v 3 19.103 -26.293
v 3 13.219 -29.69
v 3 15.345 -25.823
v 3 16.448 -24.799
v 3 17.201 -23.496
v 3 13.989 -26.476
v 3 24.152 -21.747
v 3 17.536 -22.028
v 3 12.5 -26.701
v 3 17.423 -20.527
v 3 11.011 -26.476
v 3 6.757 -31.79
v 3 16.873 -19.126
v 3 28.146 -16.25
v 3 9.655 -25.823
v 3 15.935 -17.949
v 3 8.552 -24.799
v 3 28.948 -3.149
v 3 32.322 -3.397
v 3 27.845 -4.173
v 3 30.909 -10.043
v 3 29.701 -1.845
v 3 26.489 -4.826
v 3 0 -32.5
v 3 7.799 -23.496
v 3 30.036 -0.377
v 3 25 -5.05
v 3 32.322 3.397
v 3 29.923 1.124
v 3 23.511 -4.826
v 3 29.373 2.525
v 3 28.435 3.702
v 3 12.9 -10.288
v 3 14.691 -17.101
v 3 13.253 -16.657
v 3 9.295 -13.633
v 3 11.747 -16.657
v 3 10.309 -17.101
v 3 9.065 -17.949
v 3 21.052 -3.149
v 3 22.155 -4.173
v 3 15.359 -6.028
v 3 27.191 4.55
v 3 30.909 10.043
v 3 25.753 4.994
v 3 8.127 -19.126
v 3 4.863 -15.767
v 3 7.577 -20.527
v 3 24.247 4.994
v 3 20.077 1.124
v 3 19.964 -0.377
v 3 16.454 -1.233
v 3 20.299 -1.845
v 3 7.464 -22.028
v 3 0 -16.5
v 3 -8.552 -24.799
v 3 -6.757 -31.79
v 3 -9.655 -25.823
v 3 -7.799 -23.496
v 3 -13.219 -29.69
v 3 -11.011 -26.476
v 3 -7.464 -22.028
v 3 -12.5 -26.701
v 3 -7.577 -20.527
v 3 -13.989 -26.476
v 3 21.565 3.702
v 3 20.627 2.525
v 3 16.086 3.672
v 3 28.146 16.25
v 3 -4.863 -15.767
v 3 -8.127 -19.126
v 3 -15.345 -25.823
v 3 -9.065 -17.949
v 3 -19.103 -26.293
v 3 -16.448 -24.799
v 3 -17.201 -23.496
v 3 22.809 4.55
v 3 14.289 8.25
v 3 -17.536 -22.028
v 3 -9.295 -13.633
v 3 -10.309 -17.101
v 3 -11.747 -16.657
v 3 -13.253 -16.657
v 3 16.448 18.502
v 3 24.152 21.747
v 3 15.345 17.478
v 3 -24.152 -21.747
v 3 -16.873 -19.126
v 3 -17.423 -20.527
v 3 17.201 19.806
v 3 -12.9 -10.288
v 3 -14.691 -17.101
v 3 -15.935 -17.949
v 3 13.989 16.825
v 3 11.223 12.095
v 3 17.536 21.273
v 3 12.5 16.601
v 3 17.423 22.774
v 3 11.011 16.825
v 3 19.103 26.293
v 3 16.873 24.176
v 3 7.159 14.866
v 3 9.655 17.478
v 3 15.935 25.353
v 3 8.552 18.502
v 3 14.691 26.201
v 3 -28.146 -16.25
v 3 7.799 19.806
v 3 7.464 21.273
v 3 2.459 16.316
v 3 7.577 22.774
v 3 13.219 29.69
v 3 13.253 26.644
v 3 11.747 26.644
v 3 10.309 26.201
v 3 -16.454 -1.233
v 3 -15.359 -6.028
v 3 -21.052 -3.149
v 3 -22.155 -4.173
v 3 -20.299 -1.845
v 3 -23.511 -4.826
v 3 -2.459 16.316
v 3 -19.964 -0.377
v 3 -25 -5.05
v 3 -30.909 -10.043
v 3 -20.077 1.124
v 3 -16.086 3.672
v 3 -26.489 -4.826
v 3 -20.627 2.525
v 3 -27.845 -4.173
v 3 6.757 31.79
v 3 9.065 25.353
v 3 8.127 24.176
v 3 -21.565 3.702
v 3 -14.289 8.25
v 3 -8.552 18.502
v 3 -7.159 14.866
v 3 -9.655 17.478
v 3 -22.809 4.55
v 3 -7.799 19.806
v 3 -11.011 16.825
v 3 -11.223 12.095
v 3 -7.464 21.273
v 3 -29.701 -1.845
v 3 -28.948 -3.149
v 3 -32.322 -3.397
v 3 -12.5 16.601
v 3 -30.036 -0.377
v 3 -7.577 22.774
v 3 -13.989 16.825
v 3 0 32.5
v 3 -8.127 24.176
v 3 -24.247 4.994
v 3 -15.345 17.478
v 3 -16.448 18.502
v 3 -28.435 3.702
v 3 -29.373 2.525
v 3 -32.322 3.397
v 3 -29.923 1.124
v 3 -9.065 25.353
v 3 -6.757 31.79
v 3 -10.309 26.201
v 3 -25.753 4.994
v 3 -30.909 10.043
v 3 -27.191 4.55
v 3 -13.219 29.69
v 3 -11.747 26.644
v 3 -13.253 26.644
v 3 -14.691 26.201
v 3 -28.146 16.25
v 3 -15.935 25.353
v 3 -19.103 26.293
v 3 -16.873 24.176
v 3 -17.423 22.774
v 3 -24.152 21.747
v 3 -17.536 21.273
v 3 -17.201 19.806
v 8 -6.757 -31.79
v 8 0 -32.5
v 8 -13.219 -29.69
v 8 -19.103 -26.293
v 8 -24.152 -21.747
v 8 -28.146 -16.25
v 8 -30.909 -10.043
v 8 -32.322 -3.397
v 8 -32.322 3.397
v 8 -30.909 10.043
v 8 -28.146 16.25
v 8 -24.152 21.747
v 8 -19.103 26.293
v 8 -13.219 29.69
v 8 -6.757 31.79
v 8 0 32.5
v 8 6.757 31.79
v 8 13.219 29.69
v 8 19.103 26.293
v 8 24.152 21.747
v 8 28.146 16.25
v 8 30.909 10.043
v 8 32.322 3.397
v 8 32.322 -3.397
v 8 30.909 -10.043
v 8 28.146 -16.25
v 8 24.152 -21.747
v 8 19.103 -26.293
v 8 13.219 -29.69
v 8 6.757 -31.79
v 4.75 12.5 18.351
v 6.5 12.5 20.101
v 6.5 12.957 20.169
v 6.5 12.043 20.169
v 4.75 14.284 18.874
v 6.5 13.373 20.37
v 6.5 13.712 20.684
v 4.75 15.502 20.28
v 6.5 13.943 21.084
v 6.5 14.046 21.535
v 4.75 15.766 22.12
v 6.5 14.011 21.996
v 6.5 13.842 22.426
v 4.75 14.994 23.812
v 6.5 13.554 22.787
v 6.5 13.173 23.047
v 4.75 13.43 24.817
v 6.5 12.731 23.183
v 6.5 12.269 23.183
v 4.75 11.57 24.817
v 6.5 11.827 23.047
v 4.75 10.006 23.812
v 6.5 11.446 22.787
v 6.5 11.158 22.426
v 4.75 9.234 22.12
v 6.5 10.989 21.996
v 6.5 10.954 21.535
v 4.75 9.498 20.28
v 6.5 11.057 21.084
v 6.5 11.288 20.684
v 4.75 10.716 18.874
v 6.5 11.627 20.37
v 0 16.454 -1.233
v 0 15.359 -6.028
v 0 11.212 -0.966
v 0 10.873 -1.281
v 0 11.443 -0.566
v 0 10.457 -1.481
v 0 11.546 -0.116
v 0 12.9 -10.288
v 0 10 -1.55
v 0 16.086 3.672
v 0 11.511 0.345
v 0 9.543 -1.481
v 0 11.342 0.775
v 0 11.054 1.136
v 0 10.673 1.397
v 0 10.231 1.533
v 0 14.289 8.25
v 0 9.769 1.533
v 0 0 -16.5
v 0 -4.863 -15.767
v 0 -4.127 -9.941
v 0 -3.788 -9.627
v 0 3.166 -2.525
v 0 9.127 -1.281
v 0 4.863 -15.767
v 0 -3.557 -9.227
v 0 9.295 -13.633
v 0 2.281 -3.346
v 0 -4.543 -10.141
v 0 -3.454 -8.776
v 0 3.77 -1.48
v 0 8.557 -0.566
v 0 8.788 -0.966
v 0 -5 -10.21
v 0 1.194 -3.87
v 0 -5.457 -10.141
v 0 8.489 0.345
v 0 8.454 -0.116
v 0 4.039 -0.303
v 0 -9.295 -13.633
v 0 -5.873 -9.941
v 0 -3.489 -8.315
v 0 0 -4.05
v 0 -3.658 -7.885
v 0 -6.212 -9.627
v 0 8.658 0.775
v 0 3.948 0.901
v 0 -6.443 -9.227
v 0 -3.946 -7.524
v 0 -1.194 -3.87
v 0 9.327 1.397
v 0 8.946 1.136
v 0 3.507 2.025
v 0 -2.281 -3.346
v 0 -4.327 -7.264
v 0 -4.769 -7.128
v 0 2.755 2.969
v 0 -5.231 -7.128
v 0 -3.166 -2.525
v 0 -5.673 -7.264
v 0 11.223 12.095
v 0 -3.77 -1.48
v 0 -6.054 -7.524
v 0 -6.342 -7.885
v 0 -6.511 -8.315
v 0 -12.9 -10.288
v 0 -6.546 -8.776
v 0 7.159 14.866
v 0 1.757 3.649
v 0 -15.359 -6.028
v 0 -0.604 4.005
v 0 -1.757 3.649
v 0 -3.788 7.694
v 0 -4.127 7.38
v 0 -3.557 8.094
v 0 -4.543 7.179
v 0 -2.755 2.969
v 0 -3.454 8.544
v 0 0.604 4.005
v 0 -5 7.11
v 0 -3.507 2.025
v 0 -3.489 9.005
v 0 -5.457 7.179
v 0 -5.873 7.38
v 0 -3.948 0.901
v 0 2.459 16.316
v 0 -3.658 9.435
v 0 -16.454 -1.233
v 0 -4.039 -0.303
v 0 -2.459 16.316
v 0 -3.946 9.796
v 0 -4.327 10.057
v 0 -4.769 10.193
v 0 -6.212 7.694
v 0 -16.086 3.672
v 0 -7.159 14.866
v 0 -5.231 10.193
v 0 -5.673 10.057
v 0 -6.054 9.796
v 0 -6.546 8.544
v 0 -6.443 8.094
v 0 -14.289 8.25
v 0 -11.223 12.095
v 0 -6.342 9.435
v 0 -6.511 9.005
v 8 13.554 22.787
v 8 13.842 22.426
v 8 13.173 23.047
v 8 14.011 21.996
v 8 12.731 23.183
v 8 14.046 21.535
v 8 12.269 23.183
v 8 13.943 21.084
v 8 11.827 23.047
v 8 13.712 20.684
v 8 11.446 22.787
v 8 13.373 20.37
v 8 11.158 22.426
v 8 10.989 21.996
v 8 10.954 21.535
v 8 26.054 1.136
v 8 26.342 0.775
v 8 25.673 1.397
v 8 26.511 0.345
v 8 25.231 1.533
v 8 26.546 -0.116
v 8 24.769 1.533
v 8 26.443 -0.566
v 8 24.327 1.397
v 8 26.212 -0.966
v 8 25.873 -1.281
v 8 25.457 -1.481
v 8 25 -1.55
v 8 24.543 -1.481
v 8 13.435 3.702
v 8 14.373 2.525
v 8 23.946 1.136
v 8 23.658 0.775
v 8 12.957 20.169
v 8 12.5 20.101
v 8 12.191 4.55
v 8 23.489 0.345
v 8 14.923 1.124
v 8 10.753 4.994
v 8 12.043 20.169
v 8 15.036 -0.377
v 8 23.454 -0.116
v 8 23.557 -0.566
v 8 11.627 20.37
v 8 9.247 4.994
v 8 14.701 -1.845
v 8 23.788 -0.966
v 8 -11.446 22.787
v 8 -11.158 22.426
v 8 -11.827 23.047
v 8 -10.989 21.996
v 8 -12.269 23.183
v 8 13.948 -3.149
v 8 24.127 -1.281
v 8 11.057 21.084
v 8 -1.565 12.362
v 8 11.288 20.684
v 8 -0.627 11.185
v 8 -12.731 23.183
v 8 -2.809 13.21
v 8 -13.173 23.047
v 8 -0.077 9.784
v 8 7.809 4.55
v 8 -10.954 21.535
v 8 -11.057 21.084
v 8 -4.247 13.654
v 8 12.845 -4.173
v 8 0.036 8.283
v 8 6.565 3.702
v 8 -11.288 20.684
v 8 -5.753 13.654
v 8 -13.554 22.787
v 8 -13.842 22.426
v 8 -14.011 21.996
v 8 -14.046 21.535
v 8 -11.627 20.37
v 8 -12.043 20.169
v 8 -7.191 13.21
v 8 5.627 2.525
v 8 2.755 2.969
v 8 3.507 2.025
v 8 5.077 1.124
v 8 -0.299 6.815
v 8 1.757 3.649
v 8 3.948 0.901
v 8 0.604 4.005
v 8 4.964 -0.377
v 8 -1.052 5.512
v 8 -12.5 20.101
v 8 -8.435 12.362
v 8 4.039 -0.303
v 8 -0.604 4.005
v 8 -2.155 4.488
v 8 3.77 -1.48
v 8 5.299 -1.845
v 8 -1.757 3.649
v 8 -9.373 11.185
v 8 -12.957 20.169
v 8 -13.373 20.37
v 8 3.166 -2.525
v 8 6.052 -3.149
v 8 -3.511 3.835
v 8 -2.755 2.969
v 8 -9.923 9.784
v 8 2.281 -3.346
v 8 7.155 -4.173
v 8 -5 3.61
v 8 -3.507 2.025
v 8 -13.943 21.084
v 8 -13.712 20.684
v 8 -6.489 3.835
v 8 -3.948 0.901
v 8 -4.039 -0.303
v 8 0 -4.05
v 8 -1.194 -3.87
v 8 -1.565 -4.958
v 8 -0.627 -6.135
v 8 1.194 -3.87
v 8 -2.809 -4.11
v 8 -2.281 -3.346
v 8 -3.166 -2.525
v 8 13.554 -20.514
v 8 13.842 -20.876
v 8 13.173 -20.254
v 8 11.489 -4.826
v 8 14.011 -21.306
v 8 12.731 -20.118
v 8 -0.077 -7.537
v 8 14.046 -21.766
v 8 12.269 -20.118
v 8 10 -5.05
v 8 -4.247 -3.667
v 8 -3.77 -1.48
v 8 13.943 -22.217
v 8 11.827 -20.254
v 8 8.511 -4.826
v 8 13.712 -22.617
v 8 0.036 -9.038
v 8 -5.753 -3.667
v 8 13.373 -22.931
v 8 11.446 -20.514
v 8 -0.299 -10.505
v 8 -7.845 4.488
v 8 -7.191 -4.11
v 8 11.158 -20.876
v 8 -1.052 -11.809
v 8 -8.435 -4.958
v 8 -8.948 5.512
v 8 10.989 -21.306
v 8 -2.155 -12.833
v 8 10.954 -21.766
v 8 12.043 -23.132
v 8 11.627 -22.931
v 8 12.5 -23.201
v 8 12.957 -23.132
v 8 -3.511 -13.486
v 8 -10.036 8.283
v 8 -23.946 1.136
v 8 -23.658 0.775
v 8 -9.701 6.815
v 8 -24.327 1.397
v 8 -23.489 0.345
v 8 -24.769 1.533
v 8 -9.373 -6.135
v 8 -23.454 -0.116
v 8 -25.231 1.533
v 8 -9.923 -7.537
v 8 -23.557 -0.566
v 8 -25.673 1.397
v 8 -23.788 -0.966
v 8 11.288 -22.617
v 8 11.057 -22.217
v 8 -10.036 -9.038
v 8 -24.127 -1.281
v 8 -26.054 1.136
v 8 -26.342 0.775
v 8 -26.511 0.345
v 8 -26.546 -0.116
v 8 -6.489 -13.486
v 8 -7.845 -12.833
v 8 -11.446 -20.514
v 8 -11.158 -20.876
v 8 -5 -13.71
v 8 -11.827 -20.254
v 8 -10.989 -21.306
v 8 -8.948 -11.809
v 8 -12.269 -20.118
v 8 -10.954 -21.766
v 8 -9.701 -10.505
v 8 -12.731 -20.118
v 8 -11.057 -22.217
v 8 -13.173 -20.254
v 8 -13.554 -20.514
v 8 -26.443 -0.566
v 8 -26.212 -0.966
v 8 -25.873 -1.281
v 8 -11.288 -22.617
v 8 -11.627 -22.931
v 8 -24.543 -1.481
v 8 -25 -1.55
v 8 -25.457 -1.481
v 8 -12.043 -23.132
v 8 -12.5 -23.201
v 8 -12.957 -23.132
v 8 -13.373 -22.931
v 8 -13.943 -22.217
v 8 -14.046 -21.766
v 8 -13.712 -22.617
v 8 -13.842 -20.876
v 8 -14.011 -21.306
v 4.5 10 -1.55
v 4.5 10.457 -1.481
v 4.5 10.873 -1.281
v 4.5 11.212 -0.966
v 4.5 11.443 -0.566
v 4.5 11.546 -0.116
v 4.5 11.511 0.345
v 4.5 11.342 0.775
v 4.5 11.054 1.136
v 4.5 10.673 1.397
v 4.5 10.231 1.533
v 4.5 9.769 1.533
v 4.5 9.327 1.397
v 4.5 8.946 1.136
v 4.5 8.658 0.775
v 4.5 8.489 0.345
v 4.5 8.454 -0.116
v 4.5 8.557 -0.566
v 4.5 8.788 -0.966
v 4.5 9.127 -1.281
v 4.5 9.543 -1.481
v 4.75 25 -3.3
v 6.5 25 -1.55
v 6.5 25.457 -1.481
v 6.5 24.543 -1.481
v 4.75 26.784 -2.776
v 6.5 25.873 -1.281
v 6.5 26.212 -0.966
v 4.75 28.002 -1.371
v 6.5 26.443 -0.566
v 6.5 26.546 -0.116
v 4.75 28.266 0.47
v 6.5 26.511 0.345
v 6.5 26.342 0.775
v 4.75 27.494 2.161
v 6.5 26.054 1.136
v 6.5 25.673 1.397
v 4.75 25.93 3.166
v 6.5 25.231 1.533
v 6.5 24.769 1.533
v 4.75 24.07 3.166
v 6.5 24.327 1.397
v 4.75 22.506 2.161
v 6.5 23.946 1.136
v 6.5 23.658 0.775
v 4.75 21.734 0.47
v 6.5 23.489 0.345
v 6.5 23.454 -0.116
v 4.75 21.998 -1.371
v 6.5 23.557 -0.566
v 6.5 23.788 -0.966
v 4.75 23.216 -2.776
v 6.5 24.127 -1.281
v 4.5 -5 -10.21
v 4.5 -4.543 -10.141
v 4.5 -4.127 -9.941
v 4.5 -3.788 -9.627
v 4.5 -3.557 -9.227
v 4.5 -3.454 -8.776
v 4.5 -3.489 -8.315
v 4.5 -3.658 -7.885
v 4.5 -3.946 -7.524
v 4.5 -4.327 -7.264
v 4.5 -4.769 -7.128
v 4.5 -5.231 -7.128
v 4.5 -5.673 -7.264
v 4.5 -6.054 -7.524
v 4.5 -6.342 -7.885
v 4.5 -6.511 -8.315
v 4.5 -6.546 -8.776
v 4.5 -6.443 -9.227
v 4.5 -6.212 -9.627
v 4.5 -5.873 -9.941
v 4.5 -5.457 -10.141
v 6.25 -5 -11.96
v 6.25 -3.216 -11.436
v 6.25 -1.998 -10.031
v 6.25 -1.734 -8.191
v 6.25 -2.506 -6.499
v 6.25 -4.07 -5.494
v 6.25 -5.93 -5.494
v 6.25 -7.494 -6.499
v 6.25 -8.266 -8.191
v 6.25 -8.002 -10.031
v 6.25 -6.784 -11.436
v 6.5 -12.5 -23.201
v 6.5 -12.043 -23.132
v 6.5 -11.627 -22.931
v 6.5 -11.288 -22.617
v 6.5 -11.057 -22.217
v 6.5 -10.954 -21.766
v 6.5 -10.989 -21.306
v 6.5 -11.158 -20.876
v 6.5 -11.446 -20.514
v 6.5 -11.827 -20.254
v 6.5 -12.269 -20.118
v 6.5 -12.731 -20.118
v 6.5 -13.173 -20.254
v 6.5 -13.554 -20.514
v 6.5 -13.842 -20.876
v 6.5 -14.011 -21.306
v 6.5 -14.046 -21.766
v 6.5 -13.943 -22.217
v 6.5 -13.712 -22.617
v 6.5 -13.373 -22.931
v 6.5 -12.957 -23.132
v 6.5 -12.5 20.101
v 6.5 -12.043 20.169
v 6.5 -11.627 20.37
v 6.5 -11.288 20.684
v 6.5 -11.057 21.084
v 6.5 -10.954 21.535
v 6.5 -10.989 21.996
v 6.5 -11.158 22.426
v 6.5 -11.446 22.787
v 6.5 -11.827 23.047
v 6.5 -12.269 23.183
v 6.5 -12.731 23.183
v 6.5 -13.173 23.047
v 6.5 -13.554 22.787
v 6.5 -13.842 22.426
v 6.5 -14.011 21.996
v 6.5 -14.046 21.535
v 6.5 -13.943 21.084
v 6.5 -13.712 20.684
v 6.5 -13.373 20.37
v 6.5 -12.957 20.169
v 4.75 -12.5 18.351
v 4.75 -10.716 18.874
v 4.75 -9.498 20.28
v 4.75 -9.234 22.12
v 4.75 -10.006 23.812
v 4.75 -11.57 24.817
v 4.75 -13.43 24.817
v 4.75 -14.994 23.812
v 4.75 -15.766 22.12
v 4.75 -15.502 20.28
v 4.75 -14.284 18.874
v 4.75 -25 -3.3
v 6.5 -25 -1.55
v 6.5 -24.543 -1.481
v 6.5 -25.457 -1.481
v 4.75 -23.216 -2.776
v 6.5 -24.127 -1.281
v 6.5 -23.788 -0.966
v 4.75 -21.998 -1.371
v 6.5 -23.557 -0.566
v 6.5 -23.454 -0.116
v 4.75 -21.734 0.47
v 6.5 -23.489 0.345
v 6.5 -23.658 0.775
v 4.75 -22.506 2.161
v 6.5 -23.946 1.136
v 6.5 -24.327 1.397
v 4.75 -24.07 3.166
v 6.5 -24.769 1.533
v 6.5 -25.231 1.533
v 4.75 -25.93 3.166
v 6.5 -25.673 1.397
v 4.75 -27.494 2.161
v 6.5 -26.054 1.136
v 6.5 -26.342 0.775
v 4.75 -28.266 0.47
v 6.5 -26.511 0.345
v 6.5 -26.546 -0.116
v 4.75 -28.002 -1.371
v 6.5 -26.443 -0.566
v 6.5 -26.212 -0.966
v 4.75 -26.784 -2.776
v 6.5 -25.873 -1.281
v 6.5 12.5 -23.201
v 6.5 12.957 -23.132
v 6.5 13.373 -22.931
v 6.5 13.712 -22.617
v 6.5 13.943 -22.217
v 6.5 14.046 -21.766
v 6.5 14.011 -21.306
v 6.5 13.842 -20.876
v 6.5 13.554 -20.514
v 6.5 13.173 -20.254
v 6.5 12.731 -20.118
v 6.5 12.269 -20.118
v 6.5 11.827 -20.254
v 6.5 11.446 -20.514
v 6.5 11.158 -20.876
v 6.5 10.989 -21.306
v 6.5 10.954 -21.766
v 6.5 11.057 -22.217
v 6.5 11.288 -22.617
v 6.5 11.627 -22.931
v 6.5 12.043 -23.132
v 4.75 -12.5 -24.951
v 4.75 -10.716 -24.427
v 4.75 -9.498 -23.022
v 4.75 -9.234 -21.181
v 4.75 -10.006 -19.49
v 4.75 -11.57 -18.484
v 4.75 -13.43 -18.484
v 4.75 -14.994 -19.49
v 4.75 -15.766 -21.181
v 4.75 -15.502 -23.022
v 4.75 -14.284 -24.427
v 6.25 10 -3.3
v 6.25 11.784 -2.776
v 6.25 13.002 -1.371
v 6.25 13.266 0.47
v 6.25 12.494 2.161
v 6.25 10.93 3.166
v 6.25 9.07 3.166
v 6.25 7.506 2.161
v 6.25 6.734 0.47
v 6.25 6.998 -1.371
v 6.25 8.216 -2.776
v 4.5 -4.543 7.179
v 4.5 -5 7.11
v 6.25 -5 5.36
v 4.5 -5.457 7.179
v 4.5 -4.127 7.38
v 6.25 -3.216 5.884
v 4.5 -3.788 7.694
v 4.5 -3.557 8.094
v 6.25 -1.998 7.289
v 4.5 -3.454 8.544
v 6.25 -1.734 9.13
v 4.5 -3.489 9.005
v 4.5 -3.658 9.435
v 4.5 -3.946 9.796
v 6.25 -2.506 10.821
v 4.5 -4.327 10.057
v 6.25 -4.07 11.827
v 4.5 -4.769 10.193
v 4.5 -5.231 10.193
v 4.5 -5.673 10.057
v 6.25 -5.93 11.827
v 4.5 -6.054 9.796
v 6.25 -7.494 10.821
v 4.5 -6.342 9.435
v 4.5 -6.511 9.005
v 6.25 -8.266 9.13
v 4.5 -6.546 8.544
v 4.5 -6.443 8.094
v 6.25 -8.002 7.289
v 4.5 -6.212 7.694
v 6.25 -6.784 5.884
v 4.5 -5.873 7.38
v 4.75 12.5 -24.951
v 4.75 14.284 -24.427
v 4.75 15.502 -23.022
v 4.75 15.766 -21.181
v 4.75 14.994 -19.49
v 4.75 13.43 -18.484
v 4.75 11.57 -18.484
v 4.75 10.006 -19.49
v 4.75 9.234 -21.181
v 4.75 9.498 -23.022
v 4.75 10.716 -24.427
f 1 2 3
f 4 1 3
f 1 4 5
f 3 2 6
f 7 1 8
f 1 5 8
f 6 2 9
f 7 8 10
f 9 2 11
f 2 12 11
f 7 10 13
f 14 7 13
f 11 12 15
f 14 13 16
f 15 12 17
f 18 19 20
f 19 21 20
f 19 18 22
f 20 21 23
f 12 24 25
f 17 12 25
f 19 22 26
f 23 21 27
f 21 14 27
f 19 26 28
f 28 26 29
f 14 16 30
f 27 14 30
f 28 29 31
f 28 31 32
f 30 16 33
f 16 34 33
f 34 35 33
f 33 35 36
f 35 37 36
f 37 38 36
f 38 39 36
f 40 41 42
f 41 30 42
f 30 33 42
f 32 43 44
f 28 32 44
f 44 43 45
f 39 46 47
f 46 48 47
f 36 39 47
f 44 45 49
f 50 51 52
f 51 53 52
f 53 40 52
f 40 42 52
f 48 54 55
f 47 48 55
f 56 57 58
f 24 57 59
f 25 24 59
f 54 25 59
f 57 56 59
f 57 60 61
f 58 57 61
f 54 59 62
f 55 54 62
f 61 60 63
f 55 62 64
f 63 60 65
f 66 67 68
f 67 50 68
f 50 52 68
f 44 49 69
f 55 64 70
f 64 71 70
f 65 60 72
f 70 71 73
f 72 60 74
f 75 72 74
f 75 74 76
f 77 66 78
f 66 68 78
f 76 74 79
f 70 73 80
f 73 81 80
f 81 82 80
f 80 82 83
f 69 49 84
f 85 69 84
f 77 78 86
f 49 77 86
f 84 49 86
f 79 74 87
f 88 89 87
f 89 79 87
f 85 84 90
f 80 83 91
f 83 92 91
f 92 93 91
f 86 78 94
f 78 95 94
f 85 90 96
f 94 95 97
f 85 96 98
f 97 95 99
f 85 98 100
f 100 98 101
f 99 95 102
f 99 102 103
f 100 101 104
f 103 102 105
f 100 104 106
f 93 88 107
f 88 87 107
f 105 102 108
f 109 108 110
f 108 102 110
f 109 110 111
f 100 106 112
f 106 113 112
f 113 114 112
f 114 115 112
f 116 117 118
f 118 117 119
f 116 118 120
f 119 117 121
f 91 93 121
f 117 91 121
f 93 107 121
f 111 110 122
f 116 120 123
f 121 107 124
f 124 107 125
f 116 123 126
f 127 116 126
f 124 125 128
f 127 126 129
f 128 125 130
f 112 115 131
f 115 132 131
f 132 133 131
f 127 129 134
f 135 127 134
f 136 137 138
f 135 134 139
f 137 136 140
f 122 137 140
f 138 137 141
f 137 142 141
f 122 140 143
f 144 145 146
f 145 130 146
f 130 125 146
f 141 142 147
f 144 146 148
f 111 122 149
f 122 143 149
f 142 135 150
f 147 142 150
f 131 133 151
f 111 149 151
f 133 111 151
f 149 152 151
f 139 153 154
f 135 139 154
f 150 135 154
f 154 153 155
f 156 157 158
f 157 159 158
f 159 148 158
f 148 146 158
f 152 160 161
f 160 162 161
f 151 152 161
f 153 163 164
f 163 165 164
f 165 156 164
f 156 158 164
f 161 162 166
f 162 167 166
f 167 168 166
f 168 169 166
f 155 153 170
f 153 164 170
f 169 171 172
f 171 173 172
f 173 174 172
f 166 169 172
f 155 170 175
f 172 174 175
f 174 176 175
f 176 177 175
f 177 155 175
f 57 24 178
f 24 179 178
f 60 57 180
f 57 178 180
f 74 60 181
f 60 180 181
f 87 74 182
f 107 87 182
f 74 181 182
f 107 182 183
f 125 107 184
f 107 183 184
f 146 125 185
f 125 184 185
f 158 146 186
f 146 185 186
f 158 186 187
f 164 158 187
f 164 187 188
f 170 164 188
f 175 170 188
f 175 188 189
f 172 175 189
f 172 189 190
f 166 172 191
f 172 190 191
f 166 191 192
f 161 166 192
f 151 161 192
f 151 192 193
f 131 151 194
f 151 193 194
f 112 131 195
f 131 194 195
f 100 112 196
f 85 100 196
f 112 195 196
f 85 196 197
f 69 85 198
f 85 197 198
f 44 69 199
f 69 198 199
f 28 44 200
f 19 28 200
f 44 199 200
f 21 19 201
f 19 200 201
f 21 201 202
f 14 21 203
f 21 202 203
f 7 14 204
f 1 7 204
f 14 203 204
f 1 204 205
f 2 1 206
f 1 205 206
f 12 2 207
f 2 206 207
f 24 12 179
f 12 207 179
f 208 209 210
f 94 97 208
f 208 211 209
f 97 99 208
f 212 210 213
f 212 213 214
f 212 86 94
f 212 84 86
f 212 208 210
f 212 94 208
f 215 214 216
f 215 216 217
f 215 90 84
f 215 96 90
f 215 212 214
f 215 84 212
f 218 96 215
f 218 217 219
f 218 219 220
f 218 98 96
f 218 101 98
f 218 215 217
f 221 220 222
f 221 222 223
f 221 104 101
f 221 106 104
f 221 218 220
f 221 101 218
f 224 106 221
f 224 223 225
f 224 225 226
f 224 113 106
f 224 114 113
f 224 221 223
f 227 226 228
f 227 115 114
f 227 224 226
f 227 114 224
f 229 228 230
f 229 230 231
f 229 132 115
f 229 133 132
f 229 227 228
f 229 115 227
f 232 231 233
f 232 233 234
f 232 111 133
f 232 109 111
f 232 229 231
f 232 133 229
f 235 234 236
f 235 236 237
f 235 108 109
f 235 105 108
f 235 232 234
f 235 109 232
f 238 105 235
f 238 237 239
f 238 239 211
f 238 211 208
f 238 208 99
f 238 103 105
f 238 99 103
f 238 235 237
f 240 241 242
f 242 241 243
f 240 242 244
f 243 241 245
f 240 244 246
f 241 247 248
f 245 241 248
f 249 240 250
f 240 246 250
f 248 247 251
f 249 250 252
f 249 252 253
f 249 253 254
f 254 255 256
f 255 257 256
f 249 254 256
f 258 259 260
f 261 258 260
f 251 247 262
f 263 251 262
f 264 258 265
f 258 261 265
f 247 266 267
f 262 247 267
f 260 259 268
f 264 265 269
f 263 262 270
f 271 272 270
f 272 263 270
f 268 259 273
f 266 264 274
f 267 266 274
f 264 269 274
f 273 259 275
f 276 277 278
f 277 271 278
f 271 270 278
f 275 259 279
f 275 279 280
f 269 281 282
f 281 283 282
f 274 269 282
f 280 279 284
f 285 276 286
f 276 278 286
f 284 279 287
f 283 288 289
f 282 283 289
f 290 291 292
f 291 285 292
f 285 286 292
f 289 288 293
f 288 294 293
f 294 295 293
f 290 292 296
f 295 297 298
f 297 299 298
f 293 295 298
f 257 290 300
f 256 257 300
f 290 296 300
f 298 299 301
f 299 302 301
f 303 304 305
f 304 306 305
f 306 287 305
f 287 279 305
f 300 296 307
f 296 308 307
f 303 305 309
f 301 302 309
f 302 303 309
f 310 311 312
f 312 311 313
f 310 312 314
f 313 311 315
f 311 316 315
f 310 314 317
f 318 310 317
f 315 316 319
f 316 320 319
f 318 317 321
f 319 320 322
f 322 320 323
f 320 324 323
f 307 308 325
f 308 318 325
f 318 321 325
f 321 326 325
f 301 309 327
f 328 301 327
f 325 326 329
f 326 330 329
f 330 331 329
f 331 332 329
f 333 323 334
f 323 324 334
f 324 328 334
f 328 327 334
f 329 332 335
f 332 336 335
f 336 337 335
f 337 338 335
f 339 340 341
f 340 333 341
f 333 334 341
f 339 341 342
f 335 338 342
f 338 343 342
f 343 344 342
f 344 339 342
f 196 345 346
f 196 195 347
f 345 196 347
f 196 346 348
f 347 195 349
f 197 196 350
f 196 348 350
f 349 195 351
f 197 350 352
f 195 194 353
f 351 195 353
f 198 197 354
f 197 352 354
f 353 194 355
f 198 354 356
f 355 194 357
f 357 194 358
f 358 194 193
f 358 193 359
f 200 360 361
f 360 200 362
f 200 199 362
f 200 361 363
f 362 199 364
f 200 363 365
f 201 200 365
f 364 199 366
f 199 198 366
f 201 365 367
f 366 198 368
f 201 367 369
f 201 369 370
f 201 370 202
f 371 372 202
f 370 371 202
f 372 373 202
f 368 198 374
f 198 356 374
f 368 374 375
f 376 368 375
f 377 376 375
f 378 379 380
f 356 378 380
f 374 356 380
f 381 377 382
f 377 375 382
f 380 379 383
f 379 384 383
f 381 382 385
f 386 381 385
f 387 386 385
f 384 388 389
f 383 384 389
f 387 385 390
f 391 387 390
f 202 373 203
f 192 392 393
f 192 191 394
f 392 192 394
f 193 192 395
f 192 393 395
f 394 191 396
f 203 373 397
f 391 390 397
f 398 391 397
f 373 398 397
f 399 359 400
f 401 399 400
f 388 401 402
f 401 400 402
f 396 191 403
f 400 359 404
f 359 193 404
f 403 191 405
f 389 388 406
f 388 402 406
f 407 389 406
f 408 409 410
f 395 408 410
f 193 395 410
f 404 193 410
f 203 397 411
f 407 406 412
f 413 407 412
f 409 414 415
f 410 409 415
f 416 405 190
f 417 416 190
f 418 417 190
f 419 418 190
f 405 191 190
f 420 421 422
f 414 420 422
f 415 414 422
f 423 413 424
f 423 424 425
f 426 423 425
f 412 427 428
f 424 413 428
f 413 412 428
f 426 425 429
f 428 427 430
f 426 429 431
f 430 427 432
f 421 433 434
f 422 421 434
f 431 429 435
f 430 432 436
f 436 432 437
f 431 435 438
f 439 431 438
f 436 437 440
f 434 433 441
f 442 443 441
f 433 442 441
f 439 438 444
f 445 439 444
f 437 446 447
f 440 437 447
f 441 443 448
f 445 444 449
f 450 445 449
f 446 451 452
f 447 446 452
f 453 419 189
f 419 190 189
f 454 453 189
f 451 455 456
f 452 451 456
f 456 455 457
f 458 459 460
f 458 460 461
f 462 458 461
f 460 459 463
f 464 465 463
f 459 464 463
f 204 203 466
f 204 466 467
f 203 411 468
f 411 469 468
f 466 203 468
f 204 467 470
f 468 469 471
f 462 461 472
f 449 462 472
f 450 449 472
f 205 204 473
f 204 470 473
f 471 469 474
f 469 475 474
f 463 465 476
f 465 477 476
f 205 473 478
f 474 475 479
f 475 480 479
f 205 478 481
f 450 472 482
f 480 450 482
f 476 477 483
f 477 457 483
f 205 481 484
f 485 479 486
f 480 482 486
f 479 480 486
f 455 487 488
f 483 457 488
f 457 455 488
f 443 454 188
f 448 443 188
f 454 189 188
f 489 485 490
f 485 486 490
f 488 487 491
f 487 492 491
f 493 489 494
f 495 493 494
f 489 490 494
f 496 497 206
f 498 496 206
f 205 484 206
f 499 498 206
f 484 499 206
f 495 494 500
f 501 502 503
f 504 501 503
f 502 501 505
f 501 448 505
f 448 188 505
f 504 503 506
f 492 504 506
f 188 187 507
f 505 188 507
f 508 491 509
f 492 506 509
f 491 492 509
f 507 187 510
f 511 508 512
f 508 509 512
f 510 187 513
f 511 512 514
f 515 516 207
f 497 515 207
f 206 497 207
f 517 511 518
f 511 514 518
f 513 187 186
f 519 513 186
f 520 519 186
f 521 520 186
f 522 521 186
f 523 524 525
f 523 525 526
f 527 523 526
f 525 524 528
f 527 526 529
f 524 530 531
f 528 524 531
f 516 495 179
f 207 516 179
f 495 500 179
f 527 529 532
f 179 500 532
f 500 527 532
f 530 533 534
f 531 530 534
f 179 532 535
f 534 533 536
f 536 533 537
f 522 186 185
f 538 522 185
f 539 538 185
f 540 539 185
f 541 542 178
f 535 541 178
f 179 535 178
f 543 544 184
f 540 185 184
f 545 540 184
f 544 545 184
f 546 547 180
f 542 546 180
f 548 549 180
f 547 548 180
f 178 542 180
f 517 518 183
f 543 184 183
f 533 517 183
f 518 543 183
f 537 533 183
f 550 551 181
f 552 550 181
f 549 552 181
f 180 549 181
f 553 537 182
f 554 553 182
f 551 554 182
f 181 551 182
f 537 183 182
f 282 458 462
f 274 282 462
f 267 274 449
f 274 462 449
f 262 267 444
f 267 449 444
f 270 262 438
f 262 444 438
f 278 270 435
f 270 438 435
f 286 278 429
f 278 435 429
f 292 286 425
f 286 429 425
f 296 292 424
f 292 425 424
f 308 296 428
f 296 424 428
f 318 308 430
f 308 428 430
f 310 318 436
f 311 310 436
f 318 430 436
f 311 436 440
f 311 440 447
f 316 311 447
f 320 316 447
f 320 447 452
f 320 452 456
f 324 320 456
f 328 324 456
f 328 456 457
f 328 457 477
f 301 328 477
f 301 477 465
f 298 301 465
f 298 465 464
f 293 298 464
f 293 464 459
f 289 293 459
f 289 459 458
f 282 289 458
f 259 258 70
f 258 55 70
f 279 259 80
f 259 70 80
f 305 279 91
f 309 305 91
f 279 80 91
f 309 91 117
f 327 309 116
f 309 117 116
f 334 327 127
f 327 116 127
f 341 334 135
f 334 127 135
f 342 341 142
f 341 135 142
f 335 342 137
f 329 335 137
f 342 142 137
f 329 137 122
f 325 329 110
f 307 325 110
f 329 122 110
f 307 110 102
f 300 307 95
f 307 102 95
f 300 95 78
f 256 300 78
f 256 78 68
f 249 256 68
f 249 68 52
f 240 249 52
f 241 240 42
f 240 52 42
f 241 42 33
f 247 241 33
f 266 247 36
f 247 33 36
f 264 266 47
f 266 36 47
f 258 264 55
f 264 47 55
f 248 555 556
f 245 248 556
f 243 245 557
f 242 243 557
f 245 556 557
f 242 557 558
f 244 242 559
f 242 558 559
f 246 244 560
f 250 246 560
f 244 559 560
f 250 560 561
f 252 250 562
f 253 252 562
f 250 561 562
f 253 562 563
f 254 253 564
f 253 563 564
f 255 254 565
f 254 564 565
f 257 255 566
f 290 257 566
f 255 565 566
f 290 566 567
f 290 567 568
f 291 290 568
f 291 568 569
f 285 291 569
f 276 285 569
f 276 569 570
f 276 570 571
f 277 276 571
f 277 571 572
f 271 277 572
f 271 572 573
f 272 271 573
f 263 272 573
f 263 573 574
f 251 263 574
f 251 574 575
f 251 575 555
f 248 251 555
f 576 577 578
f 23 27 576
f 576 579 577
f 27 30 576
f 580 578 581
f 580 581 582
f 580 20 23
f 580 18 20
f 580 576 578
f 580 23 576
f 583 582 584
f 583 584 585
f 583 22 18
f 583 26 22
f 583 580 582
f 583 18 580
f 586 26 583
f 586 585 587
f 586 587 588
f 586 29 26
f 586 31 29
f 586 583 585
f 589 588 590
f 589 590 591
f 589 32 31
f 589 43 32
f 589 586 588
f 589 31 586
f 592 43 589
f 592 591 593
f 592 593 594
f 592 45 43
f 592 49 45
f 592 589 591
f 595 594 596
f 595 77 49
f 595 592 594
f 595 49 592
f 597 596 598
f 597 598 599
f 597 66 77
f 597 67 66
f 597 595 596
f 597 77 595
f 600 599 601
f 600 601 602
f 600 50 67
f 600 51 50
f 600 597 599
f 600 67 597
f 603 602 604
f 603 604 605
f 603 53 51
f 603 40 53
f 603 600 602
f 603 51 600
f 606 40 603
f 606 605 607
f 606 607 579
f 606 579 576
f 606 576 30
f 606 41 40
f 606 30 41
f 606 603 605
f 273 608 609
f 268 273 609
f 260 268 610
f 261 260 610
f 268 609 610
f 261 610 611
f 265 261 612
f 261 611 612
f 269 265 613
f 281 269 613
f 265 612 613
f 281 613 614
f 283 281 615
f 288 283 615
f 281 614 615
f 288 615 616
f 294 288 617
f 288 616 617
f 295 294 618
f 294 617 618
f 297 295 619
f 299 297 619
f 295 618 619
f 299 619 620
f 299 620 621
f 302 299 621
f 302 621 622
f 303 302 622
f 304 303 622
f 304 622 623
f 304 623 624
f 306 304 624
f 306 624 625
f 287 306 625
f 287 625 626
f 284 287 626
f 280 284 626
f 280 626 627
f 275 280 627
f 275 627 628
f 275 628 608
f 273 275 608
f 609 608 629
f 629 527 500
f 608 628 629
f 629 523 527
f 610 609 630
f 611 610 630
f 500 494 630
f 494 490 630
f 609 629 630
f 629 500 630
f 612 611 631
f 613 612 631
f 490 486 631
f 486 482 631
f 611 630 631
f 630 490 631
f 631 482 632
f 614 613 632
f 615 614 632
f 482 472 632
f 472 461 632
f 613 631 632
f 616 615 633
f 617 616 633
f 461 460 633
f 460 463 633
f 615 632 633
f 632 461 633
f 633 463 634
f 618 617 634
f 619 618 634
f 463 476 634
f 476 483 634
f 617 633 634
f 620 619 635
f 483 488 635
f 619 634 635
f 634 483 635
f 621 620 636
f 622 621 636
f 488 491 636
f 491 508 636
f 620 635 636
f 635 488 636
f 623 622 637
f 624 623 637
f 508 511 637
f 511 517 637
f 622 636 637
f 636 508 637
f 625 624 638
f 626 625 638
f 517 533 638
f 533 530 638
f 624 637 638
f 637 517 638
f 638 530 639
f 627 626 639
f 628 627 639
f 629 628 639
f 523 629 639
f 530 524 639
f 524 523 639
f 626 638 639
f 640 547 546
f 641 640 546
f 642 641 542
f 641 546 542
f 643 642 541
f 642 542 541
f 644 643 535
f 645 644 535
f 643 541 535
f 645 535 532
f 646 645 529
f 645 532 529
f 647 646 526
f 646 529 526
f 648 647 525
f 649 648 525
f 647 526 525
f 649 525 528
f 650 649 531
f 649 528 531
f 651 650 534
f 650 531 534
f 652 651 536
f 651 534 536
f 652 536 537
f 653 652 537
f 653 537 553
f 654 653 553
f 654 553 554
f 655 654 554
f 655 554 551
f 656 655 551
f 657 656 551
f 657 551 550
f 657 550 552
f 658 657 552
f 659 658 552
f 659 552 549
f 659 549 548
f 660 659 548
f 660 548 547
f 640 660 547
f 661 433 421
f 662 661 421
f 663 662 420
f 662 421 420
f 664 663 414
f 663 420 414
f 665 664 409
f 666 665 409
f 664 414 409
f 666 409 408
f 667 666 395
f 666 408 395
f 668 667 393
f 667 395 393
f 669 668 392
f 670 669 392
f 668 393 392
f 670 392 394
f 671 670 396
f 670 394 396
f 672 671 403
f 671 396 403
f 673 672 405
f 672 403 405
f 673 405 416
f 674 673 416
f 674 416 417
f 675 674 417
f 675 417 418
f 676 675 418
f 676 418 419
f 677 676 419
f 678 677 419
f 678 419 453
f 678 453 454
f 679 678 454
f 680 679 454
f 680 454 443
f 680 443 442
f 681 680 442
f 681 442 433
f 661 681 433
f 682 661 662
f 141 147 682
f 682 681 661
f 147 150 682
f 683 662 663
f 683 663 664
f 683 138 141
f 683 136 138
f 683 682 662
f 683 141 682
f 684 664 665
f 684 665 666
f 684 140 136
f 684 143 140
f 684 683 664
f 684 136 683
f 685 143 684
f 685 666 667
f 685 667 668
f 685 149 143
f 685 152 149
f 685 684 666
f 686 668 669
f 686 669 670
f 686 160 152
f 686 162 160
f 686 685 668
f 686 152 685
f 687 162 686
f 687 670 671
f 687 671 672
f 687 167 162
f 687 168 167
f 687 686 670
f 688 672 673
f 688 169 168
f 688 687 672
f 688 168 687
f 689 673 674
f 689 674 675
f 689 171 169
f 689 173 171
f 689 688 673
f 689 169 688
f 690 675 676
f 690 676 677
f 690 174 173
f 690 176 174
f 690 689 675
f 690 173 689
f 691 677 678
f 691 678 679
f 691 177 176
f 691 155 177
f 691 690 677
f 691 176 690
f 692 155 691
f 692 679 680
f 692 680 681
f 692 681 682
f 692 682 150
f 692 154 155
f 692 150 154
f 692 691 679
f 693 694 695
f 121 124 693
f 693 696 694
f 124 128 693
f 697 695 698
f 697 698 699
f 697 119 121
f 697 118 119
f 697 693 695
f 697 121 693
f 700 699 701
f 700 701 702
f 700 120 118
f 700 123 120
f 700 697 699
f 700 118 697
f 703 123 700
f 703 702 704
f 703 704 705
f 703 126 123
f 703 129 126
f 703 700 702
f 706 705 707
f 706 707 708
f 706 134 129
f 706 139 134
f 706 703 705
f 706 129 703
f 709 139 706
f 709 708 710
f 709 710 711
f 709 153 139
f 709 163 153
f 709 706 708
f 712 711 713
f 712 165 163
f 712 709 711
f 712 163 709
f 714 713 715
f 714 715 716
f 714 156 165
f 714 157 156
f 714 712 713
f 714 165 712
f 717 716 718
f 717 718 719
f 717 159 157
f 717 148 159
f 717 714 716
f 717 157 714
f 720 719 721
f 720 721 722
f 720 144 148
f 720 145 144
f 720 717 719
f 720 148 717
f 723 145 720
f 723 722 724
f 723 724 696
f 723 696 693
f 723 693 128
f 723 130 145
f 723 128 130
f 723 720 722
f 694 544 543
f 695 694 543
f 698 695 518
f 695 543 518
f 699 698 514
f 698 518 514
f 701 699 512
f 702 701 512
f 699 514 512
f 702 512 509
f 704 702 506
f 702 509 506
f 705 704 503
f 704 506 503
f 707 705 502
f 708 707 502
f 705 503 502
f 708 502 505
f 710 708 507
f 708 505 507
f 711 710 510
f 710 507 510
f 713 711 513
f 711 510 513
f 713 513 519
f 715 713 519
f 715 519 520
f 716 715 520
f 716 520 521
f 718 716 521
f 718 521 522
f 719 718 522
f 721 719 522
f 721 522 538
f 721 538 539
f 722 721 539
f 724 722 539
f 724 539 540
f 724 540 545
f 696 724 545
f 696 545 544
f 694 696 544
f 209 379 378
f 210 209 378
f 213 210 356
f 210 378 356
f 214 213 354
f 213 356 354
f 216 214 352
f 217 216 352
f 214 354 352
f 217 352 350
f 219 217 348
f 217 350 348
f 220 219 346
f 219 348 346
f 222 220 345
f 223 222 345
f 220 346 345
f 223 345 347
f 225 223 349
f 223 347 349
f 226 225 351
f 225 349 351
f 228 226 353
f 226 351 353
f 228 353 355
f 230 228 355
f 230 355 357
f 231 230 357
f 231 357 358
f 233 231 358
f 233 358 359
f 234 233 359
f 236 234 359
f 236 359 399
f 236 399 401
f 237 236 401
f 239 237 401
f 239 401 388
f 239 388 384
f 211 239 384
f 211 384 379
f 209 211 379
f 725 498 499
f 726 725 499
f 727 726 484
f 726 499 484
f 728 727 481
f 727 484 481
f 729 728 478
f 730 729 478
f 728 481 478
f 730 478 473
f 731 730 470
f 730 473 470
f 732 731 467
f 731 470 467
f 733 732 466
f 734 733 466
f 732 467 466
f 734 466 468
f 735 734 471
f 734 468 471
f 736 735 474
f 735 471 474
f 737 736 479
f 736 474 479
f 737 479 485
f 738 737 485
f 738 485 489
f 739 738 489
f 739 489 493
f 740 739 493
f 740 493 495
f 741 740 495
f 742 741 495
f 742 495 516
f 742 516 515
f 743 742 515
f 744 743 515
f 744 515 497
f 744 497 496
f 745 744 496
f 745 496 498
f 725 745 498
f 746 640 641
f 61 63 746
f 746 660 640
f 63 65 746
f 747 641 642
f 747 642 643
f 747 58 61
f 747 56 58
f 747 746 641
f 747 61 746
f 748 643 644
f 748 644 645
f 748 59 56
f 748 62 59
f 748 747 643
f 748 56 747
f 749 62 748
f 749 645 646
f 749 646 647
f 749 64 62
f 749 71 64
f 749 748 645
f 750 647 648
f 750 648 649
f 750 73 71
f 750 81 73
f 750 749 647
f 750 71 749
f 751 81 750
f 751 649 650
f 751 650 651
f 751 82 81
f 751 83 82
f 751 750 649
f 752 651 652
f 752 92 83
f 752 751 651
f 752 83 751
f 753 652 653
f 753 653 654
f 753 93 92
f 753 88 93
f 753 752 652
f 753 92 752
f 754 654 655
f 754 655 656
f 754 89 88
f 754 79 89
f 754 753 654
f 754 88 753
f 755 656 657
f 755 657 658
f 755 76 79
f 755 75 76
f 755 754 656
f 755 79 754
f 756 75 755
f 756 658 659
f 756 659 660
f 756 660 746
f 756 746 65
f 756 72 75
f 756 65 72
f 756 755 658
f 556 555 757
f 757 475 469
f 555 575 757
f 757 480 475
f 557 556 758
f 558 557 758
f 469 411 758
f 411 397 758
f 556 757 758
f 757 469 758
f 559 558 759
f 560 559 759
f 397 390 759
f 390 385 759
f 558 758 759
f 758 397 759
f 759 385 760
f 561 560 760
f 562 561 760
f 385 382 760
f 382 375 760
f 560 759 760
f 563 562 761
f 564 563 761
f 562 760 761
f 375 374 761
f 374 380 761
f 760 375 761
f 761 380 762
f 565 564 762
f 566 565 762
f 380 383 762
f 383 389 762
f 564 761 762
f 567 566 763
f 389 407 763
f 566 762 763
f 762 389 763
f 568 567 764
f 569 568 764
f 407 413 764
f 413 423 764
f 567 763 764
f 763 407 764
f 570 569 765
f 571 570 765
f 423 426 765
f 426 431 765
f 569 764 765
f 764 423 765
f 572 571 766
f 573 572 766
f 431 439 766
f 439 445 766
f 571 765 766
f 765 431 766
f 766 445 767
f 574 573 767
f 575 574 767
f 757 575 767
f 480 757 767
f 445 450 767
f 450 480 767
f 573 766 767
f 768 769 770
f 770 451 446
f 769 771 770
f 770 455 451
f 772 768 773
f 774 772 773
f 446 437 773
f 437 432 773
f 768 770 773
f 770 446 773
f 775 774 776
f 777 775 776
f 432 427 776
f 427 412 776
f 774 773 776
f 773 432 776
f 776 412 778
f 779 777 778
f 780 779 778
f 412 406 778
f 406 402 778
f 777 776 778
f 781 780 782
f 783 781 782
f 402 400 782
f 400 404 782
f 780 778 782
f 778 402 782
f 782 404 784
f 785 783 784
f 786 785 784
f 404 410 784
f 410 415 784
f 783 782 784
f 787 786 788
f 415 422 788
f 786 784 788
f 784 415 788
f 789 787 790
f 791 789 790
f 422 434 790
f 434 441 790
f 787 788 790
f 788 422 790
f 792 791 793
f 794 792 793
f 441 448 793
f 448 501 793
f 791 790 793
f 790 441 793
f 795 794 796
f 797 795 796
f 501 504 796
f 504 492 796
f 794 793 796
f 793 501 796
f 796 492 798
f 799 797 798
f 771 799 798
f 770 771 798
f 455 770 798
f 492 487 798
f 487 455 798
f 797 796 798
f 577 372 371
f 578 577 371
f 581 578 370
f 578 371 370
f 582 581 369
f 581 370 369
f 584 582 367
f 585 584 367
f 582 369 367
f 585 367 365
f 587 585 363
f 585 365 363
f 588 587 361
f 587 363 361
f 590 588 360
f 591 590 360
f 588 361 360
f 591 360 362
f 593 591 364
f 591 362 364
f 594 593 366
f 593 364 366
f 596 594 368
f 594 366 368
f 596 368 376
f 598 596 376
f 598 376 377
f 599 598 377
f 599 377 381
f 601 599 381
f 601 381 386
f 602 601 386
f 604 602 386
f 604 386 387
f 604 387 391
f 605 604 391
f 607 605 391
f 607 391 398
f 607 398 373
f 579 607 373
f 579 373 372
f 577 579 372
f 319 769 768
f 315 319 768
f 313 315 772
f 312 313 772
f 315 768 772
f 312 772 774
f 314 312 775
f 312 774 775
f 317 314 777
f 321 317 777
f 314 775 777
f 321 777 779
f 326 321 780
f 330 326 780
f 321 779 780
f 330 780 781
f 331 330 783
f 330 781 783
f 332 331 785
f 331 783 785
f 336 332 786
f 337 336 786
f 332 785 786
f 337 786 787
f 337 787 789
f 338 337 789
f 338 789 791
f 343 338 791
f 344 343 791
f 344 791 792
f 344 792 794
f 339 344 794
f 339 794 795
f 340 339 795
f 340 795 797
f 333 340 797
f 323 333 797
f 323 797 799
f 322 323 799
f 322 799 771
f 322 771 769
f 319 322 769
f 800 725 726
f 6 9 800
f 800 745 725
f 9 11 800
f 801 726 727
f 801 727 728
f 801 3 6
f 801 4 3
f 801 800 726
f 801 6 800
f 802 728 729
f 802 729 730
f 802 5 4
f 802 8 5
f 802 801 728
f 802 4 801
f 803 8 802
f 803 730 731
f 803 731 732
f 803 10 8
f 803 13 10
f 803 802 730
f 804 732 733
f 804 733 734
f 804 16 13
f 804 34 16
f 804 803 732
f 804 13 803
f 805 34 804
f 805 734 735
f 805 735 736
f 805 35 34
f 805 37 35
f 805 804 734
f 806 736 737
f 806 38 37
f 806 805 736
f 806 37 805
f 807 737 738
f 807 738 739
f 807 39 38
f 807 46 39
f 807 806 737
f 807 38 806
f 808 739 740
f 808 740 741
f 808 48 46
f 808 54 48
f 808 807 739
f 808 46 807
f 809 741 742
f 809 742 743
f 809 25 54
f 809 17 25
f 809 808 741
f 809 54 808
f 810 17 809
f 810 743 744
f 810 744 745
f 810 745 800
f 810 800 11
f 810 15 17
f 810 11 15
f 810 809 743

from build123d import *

# Parameters (mm, degrees)
F_8_1_8_1_DURCHMESSER_BOHRUNG1_D = 8.1
SKIZZE4_R                        = 1.55
SCHNITT_LINEAR_AUSTRAGEN1_DEPTH  = 47.652974182
FASE1_SIZE                       = 3.5
SKIZZE5_R                        = 1.55
SCHNITT_LINEAR_AUSTRAGEN2_DEPTH  = 47.652974182
FASE2_SIZE                       = 3.5


with BuildPart() as part:
    # Skizze1 → Rotation1 (revolve)
    with BuildSketch(Plane.XY, mode=Mode.PRIVATE) as rotation1_sk:
        Polygon((0, 0), (0, 16.5), (3, 16.5), (3, 32.5), (8, 32.5), (8, 0), align=None)
    revolve(rotation1_sk.sketch.rotate(Axis((0, 0, 0), (-1, 0, 0)), 90), axis=Axis((0, 0, 0), (-1, 0, 0)))

    # Ø8.1 (8.1) Durchmesser Bohrung1 (through all)
    with Locations(Plane.ZY):
        with Locations((0, 0)):
            Hole(F_8_1_8_1_DURCHMESSER_BOHRUNG1_D / 2)

    # Skizze4 → Schnitt-Linear austragen1 (cut, through all)
    with BuildSketch(Plane(origin=(8, 0, 0), x_dir=(0, 0, -1), z_dir=(1, 0, 0))):
        with Locations((0, 10)):
            Circle(SKIZZE4_R)
        with Locations((8.660254038, -5)):
            Circle(SKIZZE4_R)
        with Locations((-8.660254038, -5)):
            Circle(SKIZZE4_R)
    extrude(amount=-SCHNITT_LINEAR_AUSTRAGEN1_DEPTH, mode=Mode.SUBTRACT)

    # Fase1
    fase1_edges = [part.edges().sort_by_distance(p)[0] for p in [
        (8, 10, 1.55),
        (8, -5, -7.110254038),
        (8, -5, 10.210254038),
    ]]
    chamfer(fase1_edges, length=FASE1_SIZE)

    # Skizze5 → Schnitt-Linear austragen2 (cut, through all)
    with BuildSketch(Plane(origin=(8, 0, 0), x_dir=(0, 0, -1), z_dir=(1, 0, 0))):
        with Locations((0, 25)):
            Circle(SKIZZE5_R)
        with Locations((21.650635095, 12.5)):
            Circle(SKIZZE5_R)
        with Locations((21.650635095, -12.5)):
            Circle(SKIZZE5_R)
        with Locations((0, -25)):
            Circle(SKIZZE5_R)
        with Locations((-21.650635095, -12.5)):
            Circle(SKIZZE5_R)
        with Locations((-21.650635095, 12.5)):
            Circle(SKIZZE5_R)
    extrude(amount=-SCHNITT_LINEAR_AUSTRAGEN2_DEPTH, mode=Mode.SUBTRACT)

    # Fase2
    fase2_edges = [part.edges().sort_by_distance(p)[0] for p in [
        (3, 25, 1.55),
        (3, 12.5, 23.200635095),
        (3, -12.5, 23.200635095),
        (3, -25, 1.55),
        (3, -12.5, -20.100635095),
        (3, 12.5, -20.100635095),
    ]]
    chamfer(fase2_edges, length=FASE2_SIZE)


solid = part.part
